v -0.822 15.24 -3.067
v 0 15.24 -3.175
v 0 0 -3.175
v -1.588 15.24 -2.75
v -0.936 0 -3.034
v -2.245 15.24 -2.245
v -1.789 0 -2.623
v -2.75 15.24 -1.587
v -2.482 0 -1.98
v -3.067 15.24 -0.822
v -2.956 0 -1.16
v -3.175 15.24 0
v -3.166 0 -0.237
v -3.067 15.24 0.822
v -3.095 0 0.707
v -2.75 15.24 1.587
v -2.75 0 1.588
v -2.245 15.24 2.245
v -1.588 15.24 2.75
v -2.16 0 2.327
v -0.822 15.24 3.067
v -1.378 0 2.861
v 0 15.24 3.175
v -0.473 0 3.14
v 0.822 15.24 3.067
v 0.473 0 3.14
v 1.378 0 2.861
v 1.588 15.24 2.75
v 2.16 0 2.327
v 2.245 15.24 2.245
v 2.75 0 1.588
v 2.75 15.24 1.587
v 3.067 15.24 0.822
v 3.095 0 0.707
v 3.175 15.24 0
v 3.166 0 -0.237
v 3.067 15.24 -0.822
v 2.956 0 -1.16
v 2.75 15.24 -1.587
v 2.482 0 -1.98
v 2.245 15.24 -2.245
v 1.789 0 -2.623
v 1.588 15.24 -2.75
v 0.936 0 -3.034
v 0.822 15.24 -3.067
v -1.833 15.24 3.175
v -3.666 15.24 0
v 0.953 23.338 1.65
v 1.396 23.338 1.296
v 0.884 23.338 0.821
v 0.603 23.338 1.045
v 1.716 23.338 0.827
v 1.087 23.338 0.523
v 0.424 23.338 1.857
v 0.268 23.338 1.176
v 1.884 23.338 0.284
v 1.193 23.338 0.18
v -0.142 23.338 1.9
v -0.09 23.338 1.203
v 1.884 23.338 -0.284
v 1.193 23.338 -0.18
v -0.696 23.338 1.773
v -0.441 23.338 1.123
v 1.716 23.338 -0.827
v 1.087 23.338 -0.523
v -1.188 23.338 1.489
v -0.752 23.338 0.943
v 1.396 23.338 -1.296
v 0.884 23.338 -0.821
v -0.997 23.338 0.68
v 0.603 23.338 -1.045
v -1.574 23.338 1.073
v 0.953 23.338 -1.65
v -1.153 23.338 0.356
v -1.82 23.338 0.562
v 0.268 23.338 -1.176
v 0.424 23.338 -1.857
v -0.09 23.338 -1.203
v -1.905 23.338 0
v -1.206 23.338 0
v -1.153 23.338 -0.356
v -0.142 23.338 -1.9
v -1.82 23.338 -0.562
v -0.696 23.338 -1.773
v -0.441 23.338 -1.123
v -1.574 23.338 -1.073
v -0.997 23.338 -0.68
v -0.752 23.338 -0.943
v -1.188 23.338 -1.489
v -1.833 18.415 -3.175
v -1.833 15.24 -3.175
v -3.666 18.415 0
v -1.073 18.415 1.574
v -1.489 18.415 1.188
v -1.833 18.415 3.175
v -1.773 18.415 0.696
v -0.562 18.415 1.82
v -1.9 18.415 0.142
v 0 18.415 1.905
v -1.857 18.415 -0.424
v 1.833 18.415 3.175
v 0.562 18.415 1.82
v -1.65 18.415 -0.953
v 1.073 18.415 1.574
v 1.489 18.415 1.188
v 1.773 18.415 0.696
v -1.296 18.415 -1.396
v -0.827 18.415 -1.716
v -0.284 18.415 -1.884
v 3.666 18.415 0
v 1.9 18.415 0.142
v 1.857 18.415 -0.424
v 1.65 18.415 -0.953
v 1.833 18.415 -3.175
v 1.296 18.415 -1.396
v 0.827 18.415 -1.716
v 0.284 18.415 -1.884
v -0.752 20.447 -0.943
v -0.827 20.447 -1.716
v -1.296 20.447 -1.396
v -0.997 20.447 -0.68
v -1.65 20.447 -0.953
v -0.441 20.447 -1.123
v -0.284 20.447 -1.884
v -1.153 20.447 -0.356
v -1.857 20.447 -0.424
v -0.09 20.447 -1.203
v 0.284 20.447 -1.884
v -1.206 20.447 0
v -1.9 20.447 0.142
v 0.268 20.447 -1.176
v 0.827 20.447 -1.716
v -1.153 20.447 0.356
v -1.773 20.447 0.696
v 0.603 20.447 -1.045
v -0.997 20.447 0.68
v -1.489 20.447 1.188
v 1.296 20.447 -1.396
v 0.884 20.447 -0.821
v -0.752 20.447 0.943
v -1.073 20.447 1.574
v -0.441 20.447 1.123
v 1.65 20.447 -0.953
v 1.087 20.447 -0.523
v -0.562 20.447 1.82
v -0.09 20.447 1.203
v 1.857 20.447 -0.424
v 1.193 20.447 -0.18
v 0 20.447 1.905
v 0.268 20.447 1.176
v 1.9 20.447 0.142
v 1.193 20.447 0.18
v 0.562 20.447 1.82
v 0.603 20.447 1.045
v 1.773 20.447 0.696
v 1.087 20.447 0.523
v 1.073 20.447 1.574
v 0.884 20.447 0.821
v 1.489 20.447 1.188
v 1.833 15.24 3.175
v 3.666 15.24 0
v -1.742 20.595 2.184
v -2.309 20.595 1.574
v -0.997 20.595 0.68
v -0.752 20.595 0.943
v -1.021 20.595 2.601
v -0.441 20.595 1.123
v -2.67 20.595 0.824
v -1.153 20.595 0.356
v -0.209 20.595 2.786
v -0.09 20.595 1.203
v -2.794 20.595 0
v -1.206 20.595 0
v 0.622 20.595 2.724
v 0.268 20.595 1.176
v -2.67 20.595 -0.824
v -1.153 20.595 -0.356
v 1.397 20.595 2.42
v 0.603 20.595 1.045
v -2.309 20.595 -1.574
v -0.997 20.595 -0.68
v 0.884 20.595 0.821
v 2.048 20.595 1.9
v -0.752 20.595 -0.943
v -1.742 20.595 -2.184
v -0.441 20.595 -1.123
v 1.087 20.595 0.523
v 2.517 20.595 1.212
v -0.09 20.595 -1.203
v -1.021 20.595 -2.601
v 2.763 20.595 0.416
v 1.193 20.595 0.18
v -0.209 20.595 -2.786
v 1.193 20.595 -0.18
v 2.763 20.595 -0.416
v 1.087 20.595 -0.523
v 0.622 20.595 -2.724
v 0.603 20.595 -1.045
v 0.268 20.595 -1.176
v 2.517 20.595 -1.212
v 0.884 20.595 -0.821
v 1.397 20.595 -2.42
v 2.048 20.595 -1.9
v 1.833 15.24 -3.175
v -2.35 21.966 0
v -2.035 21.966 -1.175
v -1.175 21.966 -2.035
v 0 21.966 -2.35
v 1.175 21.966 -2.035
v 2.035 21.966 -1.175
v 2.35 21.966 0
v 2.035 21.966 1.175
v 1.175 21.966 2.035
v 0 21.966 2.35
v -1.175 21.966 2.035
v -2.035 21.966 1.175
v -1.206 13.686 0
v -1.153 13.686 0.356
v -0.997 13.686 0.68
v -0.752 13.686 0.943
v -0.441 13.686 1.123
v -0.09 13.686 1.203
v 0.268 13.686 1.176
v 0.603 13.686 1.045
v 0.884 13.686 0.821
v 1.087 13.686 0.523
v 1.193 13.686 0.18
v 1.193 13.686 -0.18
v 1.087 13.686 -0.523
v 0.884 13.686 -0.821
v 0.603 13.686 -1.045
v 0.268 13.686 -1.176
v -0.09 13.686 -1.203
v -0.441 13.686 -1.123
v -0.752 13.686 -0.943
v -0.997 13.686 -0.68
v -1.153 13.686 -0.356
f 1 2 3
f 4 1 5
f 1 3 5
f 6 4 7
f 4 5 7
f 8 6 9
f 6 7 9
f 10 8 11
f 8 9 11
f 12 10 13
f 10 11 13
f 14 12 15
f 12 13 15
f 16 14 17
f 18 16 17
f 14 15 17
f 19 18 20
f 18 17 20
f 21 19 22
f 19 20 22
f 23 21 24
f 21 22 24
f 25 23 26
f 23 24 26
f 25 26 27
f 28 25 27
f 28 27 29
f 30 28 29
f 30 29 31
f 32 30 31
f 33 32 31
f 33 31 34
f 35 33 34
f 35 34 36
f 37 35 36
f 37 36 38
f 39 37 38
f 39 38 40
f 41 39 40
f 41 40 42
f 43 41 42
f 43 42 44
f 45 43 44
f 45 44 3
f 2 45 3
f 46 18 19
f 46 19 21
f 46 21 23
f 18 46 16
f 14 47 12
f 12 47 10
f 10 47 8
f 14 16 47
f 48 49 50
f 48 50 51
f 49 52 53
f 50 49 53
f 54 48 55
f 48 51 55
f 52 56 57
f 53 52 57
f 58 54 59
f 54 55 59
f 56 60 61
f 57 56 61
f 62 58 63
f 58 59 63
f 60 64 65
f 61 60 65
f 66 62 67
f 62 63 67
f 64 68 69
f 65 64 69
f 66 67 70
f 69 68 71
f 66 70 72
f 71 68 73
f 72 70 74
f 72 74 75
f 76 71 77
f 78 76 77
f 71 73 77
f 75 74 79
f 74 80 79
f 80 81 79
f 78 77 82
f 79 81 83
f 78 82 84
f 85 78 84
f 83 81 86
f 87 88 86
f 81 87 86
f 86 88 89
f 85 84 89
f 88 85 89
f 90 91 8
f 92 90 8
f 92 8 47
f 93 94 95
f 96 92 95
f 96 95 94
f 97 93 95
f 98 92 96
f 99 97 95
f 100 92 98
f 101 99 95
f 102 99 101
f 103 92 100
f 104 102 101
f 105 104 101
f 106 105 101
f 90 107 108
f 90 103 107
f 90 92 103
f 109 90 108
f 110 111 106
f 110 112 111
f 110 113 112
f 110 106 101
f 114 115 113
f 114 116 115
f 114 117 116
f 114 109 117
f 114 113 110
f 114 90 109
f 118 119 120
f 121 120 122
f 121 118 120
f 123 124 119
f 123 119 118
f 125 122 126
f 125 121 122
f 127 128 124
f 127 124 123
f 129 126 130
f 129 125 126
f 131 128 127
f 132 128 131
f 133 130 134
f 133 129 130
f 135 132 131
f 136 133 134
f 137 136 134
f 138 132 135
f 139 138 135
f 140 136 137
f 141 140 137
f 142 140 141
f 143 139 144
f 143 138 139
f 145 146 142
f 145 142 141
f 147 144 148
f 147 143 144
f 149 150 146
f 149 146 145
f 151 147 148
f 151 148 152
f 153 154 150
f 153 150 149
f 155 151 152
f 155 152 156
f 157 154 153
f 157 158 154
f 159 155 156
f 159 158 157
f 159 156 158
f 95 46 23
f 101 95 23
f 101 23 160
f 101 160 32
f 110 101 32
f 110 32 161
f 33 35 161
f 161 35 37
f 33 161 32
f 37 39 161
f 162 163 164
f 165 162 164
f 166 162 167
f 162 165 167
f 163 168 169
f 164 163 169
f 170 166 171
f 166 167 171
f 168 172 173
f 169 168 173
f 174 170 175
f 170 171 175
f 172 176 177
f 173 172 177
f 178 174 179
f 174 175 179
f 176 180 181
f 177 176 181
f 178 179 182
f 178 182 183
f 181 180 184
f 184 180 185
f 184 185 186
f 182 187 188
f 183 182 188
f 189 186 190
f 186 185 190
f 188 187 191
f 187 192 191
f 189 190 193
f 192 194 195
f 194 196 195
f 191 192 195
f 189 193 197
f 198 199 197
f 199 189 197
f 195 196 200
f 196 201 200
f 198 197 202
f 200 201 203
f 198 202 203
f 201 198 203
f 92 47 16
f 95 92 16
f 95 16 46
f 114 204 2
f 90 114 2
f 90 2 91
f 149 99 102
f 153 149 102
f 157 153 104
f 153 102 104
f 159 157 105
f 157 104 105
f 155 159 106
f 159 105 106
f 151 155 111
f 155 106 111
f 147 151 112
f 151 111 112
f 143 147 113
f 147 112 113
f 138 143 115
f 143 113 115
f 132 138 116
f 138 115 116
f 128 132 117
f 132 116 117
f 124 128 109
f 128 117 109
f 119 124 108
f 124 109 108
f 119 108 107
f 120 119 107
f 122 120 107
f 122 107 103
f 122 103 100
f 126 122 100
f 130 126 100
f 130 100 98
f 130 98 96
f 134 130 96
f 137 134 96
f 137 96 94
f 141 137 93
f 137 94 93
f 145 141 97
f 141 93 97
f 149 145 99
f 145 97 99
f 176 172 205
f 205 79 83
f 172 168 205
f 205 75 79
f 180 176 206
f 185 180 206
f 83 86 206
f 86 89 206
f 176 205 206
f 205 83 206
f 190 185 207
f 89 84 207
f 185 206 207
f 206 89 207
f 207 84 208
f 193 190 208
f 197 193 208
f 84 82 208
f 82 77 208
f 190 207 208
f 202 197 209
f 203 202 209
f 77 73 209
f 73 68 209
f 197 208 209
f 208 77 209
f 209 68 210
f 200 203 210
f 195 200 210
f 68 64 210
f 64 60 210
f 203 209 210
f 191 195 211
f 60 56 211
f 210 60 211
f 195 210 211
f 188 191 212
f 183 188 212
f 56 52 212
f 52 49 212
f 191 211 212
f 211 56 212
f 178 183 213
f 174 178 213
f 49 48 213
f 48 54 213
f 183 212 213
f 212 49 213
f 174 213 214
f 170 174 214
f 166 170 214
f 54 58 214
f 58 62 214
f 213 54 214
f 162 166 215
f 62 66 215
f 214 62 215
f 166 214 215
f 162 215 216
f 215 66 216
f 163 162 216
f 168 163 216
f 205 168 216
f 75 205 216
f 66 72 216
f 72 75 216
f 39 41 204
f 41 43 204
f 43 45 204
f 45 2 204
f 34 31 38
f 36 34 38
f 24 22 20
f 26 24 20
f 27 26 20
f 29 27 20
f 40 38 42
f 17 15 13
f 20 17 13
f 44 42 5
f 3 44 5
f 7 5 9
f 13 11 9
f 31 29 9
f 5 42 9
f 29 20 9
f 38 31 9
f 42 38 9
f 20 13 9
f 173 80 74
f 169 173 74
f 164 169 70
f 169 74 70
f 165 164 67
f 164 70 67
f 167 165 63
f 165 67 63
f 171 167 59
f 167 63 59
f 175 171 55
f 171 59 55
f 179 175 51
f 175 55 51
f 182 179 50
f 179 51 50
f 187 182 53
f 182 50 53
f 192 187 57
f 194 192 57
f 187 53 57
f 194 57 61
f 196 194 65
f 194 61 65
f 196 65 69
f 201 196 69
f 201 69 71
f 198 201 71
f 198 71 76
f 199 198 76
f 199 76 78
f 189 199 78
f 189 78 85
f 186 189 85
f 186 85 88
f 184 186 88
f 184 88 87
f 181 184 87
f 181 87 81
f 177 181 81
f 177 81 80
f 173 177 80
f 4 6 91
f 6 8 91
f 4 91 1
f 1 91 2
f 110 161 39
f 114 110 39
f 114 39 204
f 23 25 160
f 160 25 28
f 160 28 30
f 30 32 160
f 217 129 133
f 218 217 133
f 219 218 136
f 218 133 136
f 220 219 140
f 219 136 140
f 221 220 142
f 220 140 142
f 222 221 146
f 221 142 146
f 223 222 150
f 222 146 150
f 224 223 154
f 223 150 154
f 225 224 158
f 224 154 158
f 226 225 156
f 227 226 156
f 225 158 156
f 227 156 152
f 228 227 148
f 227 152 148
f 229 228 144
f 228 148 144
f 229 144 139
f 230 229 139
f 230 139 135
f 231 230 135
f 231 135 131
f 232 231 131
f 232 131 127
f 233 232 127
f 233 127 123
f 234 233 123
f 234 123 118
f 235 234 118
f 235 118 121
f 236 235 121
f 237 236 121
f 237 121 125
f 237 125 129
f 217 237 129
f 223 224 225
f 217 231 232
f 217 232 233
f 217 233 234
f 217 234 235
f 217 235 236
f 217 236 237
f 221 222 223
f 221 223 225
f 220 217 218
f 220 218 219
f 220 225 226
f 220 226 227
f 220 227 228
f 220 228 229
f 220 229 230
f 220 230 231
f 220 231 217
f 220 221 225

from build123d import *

# Parameters (mm, degrees)
SKETCH1_R           = 3.175
BOSS_EXTRUDE1_DEPTH = 15.24
BOSS_EXTRUDE2_DEPTH = 3.175
SKETCH3_R           = 1.905
BOSS_EXTRUDE3_DEPTH = 2.032
SKETCH8_R           = 1.2065
CUT_EXTRUDE1_DEPTH  = 9.652


with BuildPart() as part:
    # Sketch1 → Boss-Extrude1 (new body)
    with BuildSketch(Plane(origin=(0, 0, 0), x_dir=(1, 0, 0), z_dir=(0, 1, 0))):
        with Locations(Location((0, 0, 0), (0, 0, 90))):
            Circle(SKETCH1_R)
    extrude(amount=BOSS_EXTRUDE1_DEPTH)

    # Sketch2 → Boss-Extrude2 (add)
    with BuildSketch(Plane(origin=(0, 15.24, 0), x_dir=(1, 0, 0), z_dir=(0, 1, 0))):
        Polygon((3.666174209, 0), (1.833087105, 3.175), (-1.833087105, 3.175), (-3.666174209, 0), (-1.833087105, -3.175), (1.833087105, -3.175), align=None)
    extrude(amount=BOSS_EXTRUDE2_DEPTH)

    # Sketch3 → Boss-Extrude3 (add)
    with BuildSketch(Plane(origin=(0, 18.415, 0), x_dir=(1, 0, 0), z_dir=(0, 1, 0))):
        with Locations(Location((0, 0, 0), (0, 0, 270))):
            Circle(SKETCH3_R)
    extrude(amount=BOSS_EXTRUDE3_DEPTH)


with BuildPart() as body_2:
    # Sketch7 → Revolve1 (revolve)
    with BuildSketch(Plane.XY, mode=Mode.PRIVATE) as revolve1_sk:
        Polygon((0, 20.594712364), (2.794, 20.594712364), (1.905, 23.337912364), (0, 23.337912364), align=None)
    revolve(revolve1_sk.sketch.rotate(Axis((0, 23.337912364, 0), (0, -1, 0)), 180), axis=Axis((0, 23.337912364, 0), (0, -1, 0)))


with BuildPart() as cut_extrude1_tool:
    # Sketch8 → Cut-Extrude1 (new body)
    with BuildSketch(Plane(origin=(0, 23.337912364, 0), x_dir=(1, 0, 0), z_dir=(0, 1, 0))):
        with Locations(Location((0, 0, 0), (0, 0, 180))):
            Circle(SKETCH8_R)
    extrude(amount=-CUT_EXTRUDE1_DEPTH)


with BuildPart() as part_1:
    add(part.part)

    # Cut-Extrude1: cut by cut_extrude1_tool
    add(cut_extrude1_tool.part, mode=Mode.SUBTRACT)


with BuildPart() as body_2_1:
    add(body_2.part)

    # Cut-Extrude1: cut by cut_extrude1_tool
    add(cut_extrude1_tool.part, mode=Mode.SUBTRACT)


solid = Compound([part_1.part, body_2_1.part])
